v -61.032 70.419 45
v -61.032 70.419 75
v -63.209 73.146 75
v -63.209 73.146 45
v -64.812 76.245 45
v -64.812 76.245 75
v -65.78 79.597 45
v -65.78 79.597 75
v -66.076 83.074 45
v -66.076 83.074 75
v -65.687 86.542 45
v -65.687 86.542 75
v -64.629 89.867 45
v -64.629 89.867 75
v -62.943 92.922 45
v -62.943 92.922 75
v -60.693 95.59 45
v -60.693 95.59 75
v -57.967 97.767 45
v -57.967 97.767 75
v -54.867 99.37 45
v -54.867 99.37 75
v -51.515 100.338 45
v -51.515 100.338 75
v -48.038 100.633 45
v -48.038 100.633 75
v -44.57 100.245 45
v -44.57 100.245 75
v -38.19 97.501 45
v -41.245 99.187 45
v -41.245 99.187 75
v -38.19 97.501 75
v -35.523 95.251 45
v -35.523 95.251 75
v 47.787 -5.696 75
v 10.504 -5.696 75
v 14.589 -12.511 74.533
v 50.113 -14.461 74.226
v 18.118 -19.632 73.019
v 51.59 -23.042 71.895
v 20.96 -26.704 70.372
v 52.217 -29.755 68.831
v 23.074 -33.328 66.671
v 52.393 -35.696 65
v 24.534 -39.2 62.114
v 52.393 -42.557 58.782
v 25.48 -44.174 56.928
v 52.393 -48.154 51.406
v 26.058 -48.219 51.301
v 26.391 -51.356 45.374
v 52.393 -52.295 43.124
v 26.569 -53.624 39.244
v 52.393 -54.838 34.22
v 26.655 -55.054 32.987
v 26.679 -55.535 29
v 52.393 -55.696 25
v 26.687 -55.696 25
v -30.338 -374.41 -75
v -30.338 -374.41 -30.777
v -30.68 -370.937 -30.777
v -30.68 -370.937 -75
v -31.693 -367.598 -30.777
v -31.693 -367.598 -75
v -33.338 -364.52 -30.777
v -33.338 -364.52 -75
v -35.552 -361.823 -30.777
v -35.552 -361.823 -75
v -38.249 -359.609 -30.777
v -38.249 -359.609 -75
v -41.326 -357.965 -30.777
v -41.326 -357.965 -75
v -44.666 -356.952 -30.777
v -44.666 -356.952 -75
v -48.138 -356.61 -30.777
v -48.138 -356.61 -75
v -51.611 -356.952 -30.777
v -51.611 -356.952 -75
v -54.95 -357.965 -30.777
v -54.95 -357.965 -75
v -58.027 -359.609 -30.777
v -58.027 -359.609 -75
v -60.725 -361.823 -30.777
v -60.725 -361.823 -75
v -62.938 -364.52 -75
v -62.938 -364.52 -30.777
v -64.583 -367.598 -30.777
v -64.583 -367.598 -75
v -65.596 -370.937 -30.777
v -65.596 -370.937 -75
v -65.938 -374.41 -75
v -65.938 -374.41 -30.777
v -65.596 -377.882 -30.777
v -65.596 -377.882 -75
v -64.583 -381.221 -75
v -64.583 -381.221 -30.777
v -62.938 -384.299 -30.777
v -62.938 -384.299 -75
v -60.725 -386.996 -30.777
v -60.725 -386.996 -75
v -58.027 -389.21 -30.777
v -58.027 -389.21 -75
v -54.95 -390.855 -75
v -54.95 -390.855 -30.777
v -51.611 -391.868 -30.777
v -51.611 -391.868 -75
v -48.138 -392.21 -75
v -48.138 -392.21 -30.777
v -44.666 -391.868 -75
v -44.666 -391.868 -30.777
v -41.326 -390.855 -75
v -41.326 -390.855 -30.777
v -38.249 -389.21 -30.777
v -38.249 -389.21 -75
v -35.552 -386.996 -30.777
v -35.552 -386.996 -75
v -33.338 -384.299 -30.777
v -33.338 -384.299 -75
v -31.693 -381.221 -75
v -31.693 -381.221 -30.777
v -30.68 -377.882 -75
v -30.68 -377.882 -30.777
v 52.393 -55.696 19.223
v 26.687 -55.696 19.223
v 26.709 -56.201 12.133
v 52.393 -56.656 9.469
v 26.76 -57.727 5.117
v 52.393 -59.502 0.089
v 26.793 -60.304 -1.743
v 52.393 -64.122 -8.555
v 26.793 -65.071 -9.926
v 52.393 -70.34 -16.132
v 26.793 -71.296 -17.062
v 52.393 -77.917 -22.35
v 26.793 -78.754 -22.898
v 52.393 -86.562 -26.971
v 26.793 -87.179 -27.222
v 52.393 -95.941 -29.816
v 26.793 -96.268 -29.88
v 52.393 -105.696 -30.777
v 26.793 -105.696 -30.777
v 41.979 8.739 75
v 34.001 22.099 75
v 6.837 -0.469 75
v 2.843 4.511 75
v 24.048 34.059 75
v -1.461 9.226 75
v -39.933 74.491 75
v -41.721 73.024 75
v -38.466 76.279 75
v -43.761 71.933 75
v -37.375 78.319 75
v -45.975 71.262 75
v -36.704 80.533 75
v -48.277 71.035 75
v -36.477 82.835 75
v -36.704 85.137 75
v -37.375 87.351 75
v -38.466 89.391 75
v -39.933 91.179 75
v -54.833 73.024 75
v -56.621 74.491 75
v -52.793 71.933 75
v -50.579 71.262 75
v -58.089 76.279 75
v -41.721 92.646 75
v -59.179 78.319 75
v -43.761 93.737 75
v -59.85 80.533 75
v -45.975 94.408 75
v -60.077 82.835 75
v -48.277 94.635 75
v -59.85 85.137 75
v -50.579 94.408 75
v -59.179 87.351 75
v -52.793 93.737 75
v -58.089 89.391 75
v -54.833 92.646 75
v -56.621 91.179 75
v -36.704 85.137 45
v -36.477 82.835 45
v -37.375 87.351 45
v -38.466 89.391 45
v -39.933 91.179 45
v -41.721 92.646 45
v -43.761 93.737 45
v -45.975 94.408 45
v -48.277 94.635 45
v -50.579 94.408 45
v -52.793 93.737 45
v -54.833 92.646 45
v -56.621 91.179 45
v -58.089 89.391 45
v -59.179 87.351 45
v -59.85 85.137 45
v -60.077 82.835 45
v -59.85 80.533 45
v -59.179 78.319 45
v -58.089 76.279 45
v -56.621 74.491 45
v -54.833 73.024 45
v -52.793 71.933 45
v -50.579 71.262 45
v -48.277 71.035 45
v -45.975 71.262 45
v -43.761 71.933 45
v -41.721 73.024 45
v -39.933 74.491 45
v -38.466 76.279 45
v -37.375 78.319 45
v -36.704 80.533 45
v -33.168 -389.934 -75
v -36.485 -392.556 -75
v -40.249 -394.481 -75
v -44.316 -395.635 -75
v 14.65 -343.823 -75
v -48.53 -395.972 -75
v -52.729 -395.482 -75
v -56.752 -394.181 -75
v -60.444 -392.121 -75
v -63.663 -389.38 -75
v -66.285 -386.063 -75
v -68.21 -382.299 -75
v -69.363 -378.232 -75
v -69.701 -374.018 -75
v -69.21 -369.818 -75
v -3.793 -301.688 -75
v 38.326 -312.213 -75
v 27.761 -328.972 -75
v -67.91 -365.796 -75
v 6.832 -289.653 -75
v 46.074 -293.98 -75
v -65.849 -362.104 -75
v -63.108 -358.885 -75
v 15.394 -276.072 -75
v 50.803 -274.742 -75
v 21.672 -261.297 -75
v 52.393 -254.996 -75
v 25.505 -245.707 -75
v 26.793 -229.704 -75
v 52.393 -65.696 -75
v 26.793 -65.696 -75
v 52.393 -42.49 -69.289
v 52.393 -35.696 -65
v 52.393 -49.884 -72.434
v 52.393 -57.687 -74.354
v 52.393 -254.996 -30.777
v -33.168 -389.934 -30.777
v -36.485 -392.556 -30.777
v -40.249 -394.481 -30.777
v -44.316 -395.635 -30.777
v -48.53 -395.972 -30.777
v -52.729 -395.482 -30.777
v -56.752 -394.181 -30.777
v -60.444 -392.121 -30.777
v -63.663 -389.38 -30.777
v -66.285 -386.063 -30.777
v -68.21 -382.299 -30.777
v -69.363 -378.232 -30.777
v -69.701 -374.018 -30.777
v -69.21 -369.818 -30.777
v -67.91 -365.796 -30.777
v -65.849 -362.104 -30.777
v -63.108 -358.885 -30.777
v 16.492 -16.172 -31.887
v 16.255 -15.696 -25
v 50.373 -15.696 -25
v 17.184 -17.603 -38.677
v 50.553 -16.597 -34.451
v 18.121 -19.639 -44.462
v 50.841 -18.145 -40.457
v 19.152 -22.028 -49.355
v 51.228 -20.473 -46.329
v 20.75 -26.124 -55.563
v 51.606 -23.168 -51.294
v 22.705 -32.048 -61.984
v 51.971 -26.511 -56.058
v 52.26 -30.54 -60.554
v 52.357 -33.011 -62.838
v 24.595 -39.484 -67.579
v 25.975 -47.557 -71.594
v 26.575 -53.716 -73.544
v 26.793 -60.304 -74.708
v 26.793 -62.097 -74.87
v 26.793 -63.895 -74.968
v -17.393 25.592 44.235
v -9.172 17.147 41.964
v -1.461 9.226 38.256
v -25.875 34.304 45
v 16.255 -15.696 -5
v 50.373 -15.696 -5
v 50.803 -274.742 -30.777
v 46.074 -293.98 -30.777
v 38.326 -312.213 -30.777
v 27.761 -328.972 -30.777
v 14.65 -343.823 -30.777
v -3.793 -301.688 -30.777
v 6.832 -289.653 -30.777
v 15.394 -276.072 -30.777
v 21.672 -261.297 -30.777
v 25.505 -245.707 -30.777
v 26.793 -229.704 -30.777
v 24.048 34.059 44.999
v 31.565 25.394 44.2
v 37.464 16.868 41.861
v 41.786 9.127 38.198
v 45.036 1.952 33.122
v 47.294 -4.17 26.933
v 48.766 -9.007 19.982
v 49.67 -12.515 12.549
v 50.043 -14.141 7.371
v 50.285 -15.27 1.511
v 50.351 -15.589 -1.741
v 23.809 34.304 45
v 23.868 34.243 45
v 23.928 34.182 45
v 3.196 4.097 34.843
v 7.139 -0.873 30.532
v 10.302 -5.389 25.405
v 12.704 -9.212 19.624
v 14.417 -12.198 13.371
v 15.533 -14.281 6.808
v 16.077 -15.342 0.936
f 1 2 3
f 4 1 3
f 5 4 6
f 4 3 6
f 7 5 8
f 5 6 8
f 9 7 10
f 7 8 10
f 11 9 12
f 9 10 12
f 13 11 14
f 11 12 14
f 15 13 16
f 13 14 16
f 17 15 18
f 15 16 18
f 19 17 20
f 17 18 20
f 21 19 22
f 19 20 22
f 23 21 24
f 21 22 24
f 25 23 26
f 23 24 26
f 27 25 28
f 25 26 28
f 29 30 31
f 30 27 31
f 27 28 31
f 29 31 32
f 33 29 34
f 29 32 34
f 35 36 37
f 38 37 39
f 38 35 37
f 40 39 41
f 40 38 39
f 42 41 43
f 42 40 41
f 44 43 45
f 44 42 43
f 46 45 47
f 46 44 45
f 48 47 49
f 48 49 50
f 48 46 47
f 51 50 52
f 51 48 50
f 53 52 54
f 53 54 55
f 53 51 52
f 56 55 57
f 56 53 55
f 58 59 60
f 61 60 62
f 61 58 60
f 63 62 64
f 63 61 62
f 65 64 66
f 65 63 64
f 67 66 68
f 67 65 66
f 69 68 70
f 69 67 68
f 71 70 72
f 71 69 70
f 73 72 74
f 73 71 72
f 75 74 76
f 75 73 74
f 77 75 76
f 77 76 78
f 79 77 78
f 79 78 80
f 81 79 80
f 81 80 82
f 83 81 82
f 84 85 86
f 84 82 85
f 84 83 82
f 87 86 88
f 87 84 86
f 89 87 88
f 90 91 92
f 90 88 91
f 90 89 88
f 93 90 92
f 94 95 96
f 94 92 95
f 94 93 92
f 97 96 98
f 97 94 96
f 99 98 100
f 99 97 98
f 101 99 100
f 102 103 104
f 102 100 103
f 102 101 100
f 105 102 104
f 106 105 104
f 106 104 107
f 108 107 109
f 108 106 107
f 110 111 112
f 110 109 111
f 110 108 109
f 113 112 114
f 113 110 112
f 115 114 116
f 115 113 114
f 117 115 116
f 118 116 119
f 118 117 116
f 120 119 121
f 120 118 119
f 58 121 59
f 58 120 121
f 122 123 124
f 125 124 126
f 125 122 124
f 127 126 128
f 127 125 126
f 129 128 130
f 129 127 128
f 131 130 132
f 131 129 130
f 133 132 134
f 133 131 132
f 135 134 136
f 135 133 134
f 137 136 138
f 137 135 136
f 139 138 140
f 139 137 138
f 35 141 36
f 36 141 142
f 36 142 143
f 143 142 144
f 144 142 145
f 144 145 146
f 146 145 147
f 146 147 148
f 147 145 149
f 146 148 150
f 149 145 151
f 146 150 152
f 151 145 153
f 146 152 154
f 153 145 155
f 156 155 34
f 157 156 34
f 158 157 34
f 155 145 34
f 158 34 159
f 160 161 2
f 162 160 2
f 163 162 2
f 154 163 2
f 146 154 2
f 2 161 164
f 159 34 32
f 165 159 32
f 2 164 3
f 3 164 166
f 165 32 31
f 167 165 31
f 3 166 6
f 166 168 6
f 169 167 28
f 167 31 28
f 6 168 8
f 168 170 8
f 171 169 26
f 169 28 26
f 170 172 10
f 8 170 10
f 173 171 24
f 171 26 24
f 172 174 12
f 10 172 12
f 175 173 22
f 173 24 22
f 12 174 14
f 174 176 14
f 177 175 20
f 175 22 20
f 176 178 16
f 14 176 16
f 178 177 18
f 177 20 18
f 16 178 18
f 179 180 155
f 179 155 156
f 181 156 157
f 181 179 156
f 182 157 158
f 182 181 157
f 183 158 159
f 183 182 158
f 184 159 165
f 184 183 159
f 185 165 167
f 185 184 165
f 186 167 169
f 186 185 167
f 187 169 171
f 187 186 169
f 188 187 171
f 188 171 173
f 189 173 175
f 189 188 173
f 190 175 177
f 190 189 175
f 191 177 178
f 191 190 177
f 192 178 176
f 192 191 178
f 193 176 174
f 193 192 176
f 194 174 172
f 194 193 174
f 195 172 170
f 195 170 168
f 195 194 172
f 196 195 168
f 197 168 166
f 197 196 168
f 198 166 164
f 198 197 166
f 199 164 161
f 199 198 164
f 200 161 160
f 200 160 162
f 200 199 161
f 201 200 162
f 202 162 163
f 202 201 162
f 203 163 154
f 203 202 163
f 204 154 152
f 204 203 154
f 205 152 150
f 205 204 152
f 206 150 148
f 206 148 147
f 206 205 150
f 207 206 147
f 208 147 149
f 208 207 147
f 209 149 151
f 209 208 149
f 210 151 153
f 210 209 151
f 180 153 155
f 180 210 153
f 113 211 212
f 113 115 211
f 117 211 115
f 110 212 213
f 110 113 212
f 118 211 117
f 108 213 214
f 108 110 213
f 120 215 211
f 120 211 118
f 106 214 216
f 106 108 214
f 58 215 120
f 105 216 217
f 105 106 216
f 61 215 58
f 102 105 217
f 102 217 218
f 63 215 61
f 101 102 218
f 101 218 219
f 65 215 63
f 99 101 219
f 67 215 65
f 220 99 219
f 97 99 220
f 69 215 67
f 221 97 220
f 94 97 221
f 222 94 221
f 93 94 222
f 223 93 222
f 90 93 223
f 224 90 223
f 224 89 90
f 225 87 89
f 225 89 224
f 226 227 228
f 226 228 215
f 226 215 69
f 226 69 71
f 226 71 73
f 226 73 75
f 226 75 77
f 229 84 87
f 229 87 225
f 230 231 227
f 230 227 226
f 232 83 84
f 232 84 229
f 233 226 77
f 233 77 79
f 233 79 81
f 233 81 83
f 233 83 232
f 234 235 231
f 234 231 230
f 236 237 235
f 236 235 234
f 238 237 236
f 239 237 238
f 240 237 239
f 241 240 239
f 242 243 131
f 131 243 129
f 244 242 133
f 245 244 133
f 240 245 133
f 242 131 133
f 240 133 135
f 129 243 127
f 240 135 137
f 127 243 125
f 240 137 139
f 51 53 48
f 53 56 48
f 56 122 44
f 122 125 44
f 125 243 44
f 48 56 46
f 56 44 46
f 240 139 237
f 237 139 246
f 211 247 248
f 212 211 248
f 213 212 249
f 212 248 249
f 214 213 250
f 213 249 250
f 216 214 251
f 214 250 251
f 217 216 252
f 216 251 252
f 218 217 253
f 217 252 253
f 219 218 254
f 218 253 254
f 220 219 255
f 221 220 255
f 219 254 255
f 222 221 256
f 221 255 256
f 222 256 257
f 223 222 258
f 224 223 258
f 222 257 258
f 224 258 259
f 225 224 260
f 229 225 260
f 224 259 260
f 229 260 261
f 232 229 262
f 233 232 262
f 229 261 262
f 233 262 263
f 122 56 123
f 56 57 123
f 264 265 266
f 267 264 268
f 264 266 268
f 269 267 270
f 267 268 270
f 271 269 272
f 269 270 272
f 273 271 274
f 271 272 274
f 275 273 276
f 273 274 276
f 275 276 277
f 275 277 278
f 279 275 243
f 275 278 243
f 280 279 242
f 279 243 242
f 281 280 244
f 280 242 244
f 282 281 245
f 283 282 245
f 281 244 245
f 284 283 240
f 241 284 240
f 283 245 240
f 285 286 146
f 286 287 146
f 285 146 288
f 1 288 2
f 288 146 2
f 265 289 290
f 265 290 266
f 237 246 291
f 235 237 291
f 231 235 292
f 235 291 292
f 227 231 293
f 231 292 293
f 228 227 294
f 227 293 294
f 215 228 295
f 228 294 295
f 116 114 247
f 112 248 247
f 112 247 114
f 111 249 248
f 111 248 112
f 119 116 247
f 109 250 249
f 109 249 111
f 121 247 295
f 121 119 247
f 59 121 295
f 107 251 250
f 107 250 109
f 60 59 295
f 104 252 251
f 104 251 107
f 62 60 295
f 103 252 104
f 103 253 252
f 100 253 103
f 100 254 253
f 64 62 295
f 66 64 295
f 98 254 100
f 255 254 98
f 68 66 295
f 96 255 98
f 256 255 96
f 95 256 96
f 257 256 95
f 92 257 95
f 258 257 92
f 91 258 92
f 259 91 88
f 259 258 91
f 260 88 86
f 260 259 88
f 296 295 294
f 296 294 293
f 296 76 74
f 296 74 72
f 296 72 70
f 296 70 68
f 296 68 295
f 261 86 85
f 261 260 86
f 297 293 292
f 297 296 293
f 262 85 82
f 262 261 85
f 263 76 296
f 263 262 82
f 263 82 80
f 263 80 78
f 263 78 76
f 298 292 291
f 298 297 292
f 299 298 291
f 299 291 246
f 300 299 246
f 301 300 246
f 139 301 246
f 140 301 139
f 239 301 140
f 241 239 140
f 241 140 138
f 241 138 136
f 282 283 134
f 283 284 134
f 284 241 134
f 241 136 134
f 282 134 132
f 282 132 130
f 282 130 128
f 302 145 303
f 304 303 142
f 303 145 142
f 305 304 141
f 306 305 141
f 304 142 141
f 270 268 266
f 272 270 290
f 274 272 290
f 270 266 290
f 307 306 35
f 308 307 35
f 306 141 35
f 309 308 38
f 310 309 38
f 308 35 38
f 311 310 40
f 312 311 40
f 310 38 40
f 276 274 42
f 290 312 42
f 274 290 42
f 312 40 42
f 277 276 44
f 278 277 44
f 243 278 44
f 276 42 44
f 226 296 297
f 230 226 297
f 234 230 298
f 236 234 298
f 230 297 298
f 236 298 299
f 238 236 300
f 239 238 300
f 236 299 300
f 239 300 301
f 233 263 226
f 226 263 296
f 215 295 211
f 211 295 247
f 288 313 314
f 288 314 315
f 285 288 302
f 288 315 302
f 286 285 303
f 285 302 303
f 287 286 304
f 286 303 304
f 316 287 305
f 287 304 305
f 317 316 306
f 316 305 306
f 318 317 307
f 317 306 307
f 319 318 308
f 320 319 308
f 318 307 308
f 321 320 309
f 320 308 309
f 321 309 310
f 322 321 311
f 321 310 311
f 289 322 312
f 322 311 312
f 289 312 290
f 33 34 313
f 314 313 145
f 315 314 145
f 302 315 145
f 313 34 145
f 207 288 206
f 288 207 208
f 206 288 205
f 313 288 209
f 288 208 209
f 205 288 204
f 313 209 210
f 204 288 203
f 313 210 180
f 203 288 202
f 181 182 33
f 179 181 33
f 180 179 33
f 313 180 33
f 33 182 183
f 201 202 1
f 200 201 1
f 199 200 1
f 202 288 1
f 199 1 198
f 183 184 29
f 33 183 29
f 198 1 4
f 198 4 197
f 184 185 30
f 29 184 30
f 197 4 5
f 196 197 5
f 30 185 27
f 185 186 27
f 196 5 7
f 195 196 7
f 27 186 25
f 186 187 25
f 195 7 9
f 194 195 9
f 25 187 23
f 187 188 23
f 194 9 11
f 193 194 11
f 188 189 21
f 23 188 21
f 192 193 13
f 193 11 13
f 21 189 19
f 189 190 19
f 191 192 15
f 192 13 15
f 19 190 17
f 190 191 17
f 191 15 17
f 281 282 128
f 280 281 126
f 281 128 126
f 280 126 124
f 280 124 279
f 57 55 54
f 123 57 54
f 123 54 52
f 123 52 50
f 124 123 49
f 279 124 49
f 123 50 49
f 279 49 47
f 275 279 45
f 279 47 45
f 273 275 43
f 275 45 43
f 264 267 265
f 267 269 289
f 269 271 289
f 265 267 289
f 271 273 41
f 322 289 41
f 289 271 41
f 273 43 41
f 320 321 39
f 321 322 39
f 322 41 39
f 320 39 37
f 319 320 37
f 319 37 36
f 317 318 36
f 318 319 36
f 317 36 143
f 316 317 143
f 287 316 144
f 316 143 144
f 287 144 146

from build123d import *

# Parameters (mm, degrees)
SKETCH_1_R               = 11.8
SKETCH_1_R_2             = 17.8
EXTRUDE_2_DEPTH          = 75
CUT_EXTRUDE_1_DEPTH      = 409.99959193
CUT_EXTRUDE_1_DEPTH_BACK = 409.99959193
SKETCH_2_W               = 349.9
SKETCH_2_H               = 931.6
SKETCH_2_W_2             = 272.2
SKETCH_2_H_2             = 1939.2
FILLET_1_R               = 50


with BuildPart() as part:
    # 草图1 → 凸台-拉伸2 (new, symmetric)
    with BuildSketch(Plane.XY):
        with BuildLine():
            Line((-35.522730508, 95.251379062), (24.047591424, 34.058759041))
            ThreePointArc((24.047591424, 34.058759041), (45.036365139, 1.951247863), (52.39346962, -35.695716288))
            Line((52.39346962, -35.695716288), (52.39346962, -254.995716288))
            ThreePointArc((52.39346962, -254.995716288), (42.566387073, -303.252504348), (14.650341024, -343.823226775))
            Line((14.650341024, -343.823226775), (-33.168257533, -389.93401824))
            ThreePointArc((-33.168257533, -389.93401824), (-63.662585593, -389.379575912), (-63.108143264, -358.885247852))
            Line((-63.108143264, -358.885247852), (-3.792973322, -301.688476836))
            ThreePointArc((-3.792973322, -301.688476836), (18.829755143, -268.810595941), (26.79346962, -229.704047294))
            Line((26.79346962, -229.704047294), (26.79346962, -60.304047294))
            ThreePointArc((26.79346962, -60.304047294), (19.460018396, -22.778118982), (-1.461275938, 9.226165824))
            Line((-1.461275938, 9.226165824), (-61.03159787, 70.418785844))
            ThreePointArc((-61.03159787, 70.418785844), (-60.693460797, 95.589516134), (-35.522730508, 95.251379062))
        make_face()
        with Locations((-48.277164189, 82.835082453)):
            Circle(SKETCH_1_R, mode=Mode.SUBTRACT)
        with Locations((-48.138200399, -374.409633046)):
            Circle(SKETCH_1_R_2, mode=Mode.SUBTRACT)
    extrude(amount=EXTRUDE_2_DEPTH, both=True)

    # 草图2 → 切除-拉伸1 (cut, two sides: drawn at the far end of the back side and taken through both)
    with BuildSketch(Plane(origin=(0, 0, 0), x_dir=(0, 0, -1), z_dir=(1, 0, 0)).offset(-CUT_EXTRUDE_1_DEPTH_BACK)):
        with Locations((129.95, 450.104283712)):
            Rectangle(SKETCH_2_W, SKETCH_2_H)
        with Locations((-105.32326979, -1025.295716288)):
            Rectangle(SKETCH_2_W_2, SKETCH_2_H_2)
    extrude(amount=CUT_EXTRUDE_1_DEPTH + CUT_EXTRUDE_1_DEPTH_BACK, mode=Mode.SUBTRACT)

    # 圆角1
    fillet_1_edges = [part.edges().sort_by_distance(p)[0] for p in [
        (33.313903749, -15.695716288, 45),
        (39.5401781, -55.695716288, -30.77673021),
    ]]
    fillet(fillet_1_edges, radius=FILLET_1_R)
    fillet_1_2_edges = [part.edges().sort_by_distance(p)[0] for p in [
        (39.5401781, -55.695716288, 75),
        (33.313903749, -15.695716288, -75),
    ]]
    fillet(fillet_1_2_edges, radius=FILLET_1_R)


solid = part.part
